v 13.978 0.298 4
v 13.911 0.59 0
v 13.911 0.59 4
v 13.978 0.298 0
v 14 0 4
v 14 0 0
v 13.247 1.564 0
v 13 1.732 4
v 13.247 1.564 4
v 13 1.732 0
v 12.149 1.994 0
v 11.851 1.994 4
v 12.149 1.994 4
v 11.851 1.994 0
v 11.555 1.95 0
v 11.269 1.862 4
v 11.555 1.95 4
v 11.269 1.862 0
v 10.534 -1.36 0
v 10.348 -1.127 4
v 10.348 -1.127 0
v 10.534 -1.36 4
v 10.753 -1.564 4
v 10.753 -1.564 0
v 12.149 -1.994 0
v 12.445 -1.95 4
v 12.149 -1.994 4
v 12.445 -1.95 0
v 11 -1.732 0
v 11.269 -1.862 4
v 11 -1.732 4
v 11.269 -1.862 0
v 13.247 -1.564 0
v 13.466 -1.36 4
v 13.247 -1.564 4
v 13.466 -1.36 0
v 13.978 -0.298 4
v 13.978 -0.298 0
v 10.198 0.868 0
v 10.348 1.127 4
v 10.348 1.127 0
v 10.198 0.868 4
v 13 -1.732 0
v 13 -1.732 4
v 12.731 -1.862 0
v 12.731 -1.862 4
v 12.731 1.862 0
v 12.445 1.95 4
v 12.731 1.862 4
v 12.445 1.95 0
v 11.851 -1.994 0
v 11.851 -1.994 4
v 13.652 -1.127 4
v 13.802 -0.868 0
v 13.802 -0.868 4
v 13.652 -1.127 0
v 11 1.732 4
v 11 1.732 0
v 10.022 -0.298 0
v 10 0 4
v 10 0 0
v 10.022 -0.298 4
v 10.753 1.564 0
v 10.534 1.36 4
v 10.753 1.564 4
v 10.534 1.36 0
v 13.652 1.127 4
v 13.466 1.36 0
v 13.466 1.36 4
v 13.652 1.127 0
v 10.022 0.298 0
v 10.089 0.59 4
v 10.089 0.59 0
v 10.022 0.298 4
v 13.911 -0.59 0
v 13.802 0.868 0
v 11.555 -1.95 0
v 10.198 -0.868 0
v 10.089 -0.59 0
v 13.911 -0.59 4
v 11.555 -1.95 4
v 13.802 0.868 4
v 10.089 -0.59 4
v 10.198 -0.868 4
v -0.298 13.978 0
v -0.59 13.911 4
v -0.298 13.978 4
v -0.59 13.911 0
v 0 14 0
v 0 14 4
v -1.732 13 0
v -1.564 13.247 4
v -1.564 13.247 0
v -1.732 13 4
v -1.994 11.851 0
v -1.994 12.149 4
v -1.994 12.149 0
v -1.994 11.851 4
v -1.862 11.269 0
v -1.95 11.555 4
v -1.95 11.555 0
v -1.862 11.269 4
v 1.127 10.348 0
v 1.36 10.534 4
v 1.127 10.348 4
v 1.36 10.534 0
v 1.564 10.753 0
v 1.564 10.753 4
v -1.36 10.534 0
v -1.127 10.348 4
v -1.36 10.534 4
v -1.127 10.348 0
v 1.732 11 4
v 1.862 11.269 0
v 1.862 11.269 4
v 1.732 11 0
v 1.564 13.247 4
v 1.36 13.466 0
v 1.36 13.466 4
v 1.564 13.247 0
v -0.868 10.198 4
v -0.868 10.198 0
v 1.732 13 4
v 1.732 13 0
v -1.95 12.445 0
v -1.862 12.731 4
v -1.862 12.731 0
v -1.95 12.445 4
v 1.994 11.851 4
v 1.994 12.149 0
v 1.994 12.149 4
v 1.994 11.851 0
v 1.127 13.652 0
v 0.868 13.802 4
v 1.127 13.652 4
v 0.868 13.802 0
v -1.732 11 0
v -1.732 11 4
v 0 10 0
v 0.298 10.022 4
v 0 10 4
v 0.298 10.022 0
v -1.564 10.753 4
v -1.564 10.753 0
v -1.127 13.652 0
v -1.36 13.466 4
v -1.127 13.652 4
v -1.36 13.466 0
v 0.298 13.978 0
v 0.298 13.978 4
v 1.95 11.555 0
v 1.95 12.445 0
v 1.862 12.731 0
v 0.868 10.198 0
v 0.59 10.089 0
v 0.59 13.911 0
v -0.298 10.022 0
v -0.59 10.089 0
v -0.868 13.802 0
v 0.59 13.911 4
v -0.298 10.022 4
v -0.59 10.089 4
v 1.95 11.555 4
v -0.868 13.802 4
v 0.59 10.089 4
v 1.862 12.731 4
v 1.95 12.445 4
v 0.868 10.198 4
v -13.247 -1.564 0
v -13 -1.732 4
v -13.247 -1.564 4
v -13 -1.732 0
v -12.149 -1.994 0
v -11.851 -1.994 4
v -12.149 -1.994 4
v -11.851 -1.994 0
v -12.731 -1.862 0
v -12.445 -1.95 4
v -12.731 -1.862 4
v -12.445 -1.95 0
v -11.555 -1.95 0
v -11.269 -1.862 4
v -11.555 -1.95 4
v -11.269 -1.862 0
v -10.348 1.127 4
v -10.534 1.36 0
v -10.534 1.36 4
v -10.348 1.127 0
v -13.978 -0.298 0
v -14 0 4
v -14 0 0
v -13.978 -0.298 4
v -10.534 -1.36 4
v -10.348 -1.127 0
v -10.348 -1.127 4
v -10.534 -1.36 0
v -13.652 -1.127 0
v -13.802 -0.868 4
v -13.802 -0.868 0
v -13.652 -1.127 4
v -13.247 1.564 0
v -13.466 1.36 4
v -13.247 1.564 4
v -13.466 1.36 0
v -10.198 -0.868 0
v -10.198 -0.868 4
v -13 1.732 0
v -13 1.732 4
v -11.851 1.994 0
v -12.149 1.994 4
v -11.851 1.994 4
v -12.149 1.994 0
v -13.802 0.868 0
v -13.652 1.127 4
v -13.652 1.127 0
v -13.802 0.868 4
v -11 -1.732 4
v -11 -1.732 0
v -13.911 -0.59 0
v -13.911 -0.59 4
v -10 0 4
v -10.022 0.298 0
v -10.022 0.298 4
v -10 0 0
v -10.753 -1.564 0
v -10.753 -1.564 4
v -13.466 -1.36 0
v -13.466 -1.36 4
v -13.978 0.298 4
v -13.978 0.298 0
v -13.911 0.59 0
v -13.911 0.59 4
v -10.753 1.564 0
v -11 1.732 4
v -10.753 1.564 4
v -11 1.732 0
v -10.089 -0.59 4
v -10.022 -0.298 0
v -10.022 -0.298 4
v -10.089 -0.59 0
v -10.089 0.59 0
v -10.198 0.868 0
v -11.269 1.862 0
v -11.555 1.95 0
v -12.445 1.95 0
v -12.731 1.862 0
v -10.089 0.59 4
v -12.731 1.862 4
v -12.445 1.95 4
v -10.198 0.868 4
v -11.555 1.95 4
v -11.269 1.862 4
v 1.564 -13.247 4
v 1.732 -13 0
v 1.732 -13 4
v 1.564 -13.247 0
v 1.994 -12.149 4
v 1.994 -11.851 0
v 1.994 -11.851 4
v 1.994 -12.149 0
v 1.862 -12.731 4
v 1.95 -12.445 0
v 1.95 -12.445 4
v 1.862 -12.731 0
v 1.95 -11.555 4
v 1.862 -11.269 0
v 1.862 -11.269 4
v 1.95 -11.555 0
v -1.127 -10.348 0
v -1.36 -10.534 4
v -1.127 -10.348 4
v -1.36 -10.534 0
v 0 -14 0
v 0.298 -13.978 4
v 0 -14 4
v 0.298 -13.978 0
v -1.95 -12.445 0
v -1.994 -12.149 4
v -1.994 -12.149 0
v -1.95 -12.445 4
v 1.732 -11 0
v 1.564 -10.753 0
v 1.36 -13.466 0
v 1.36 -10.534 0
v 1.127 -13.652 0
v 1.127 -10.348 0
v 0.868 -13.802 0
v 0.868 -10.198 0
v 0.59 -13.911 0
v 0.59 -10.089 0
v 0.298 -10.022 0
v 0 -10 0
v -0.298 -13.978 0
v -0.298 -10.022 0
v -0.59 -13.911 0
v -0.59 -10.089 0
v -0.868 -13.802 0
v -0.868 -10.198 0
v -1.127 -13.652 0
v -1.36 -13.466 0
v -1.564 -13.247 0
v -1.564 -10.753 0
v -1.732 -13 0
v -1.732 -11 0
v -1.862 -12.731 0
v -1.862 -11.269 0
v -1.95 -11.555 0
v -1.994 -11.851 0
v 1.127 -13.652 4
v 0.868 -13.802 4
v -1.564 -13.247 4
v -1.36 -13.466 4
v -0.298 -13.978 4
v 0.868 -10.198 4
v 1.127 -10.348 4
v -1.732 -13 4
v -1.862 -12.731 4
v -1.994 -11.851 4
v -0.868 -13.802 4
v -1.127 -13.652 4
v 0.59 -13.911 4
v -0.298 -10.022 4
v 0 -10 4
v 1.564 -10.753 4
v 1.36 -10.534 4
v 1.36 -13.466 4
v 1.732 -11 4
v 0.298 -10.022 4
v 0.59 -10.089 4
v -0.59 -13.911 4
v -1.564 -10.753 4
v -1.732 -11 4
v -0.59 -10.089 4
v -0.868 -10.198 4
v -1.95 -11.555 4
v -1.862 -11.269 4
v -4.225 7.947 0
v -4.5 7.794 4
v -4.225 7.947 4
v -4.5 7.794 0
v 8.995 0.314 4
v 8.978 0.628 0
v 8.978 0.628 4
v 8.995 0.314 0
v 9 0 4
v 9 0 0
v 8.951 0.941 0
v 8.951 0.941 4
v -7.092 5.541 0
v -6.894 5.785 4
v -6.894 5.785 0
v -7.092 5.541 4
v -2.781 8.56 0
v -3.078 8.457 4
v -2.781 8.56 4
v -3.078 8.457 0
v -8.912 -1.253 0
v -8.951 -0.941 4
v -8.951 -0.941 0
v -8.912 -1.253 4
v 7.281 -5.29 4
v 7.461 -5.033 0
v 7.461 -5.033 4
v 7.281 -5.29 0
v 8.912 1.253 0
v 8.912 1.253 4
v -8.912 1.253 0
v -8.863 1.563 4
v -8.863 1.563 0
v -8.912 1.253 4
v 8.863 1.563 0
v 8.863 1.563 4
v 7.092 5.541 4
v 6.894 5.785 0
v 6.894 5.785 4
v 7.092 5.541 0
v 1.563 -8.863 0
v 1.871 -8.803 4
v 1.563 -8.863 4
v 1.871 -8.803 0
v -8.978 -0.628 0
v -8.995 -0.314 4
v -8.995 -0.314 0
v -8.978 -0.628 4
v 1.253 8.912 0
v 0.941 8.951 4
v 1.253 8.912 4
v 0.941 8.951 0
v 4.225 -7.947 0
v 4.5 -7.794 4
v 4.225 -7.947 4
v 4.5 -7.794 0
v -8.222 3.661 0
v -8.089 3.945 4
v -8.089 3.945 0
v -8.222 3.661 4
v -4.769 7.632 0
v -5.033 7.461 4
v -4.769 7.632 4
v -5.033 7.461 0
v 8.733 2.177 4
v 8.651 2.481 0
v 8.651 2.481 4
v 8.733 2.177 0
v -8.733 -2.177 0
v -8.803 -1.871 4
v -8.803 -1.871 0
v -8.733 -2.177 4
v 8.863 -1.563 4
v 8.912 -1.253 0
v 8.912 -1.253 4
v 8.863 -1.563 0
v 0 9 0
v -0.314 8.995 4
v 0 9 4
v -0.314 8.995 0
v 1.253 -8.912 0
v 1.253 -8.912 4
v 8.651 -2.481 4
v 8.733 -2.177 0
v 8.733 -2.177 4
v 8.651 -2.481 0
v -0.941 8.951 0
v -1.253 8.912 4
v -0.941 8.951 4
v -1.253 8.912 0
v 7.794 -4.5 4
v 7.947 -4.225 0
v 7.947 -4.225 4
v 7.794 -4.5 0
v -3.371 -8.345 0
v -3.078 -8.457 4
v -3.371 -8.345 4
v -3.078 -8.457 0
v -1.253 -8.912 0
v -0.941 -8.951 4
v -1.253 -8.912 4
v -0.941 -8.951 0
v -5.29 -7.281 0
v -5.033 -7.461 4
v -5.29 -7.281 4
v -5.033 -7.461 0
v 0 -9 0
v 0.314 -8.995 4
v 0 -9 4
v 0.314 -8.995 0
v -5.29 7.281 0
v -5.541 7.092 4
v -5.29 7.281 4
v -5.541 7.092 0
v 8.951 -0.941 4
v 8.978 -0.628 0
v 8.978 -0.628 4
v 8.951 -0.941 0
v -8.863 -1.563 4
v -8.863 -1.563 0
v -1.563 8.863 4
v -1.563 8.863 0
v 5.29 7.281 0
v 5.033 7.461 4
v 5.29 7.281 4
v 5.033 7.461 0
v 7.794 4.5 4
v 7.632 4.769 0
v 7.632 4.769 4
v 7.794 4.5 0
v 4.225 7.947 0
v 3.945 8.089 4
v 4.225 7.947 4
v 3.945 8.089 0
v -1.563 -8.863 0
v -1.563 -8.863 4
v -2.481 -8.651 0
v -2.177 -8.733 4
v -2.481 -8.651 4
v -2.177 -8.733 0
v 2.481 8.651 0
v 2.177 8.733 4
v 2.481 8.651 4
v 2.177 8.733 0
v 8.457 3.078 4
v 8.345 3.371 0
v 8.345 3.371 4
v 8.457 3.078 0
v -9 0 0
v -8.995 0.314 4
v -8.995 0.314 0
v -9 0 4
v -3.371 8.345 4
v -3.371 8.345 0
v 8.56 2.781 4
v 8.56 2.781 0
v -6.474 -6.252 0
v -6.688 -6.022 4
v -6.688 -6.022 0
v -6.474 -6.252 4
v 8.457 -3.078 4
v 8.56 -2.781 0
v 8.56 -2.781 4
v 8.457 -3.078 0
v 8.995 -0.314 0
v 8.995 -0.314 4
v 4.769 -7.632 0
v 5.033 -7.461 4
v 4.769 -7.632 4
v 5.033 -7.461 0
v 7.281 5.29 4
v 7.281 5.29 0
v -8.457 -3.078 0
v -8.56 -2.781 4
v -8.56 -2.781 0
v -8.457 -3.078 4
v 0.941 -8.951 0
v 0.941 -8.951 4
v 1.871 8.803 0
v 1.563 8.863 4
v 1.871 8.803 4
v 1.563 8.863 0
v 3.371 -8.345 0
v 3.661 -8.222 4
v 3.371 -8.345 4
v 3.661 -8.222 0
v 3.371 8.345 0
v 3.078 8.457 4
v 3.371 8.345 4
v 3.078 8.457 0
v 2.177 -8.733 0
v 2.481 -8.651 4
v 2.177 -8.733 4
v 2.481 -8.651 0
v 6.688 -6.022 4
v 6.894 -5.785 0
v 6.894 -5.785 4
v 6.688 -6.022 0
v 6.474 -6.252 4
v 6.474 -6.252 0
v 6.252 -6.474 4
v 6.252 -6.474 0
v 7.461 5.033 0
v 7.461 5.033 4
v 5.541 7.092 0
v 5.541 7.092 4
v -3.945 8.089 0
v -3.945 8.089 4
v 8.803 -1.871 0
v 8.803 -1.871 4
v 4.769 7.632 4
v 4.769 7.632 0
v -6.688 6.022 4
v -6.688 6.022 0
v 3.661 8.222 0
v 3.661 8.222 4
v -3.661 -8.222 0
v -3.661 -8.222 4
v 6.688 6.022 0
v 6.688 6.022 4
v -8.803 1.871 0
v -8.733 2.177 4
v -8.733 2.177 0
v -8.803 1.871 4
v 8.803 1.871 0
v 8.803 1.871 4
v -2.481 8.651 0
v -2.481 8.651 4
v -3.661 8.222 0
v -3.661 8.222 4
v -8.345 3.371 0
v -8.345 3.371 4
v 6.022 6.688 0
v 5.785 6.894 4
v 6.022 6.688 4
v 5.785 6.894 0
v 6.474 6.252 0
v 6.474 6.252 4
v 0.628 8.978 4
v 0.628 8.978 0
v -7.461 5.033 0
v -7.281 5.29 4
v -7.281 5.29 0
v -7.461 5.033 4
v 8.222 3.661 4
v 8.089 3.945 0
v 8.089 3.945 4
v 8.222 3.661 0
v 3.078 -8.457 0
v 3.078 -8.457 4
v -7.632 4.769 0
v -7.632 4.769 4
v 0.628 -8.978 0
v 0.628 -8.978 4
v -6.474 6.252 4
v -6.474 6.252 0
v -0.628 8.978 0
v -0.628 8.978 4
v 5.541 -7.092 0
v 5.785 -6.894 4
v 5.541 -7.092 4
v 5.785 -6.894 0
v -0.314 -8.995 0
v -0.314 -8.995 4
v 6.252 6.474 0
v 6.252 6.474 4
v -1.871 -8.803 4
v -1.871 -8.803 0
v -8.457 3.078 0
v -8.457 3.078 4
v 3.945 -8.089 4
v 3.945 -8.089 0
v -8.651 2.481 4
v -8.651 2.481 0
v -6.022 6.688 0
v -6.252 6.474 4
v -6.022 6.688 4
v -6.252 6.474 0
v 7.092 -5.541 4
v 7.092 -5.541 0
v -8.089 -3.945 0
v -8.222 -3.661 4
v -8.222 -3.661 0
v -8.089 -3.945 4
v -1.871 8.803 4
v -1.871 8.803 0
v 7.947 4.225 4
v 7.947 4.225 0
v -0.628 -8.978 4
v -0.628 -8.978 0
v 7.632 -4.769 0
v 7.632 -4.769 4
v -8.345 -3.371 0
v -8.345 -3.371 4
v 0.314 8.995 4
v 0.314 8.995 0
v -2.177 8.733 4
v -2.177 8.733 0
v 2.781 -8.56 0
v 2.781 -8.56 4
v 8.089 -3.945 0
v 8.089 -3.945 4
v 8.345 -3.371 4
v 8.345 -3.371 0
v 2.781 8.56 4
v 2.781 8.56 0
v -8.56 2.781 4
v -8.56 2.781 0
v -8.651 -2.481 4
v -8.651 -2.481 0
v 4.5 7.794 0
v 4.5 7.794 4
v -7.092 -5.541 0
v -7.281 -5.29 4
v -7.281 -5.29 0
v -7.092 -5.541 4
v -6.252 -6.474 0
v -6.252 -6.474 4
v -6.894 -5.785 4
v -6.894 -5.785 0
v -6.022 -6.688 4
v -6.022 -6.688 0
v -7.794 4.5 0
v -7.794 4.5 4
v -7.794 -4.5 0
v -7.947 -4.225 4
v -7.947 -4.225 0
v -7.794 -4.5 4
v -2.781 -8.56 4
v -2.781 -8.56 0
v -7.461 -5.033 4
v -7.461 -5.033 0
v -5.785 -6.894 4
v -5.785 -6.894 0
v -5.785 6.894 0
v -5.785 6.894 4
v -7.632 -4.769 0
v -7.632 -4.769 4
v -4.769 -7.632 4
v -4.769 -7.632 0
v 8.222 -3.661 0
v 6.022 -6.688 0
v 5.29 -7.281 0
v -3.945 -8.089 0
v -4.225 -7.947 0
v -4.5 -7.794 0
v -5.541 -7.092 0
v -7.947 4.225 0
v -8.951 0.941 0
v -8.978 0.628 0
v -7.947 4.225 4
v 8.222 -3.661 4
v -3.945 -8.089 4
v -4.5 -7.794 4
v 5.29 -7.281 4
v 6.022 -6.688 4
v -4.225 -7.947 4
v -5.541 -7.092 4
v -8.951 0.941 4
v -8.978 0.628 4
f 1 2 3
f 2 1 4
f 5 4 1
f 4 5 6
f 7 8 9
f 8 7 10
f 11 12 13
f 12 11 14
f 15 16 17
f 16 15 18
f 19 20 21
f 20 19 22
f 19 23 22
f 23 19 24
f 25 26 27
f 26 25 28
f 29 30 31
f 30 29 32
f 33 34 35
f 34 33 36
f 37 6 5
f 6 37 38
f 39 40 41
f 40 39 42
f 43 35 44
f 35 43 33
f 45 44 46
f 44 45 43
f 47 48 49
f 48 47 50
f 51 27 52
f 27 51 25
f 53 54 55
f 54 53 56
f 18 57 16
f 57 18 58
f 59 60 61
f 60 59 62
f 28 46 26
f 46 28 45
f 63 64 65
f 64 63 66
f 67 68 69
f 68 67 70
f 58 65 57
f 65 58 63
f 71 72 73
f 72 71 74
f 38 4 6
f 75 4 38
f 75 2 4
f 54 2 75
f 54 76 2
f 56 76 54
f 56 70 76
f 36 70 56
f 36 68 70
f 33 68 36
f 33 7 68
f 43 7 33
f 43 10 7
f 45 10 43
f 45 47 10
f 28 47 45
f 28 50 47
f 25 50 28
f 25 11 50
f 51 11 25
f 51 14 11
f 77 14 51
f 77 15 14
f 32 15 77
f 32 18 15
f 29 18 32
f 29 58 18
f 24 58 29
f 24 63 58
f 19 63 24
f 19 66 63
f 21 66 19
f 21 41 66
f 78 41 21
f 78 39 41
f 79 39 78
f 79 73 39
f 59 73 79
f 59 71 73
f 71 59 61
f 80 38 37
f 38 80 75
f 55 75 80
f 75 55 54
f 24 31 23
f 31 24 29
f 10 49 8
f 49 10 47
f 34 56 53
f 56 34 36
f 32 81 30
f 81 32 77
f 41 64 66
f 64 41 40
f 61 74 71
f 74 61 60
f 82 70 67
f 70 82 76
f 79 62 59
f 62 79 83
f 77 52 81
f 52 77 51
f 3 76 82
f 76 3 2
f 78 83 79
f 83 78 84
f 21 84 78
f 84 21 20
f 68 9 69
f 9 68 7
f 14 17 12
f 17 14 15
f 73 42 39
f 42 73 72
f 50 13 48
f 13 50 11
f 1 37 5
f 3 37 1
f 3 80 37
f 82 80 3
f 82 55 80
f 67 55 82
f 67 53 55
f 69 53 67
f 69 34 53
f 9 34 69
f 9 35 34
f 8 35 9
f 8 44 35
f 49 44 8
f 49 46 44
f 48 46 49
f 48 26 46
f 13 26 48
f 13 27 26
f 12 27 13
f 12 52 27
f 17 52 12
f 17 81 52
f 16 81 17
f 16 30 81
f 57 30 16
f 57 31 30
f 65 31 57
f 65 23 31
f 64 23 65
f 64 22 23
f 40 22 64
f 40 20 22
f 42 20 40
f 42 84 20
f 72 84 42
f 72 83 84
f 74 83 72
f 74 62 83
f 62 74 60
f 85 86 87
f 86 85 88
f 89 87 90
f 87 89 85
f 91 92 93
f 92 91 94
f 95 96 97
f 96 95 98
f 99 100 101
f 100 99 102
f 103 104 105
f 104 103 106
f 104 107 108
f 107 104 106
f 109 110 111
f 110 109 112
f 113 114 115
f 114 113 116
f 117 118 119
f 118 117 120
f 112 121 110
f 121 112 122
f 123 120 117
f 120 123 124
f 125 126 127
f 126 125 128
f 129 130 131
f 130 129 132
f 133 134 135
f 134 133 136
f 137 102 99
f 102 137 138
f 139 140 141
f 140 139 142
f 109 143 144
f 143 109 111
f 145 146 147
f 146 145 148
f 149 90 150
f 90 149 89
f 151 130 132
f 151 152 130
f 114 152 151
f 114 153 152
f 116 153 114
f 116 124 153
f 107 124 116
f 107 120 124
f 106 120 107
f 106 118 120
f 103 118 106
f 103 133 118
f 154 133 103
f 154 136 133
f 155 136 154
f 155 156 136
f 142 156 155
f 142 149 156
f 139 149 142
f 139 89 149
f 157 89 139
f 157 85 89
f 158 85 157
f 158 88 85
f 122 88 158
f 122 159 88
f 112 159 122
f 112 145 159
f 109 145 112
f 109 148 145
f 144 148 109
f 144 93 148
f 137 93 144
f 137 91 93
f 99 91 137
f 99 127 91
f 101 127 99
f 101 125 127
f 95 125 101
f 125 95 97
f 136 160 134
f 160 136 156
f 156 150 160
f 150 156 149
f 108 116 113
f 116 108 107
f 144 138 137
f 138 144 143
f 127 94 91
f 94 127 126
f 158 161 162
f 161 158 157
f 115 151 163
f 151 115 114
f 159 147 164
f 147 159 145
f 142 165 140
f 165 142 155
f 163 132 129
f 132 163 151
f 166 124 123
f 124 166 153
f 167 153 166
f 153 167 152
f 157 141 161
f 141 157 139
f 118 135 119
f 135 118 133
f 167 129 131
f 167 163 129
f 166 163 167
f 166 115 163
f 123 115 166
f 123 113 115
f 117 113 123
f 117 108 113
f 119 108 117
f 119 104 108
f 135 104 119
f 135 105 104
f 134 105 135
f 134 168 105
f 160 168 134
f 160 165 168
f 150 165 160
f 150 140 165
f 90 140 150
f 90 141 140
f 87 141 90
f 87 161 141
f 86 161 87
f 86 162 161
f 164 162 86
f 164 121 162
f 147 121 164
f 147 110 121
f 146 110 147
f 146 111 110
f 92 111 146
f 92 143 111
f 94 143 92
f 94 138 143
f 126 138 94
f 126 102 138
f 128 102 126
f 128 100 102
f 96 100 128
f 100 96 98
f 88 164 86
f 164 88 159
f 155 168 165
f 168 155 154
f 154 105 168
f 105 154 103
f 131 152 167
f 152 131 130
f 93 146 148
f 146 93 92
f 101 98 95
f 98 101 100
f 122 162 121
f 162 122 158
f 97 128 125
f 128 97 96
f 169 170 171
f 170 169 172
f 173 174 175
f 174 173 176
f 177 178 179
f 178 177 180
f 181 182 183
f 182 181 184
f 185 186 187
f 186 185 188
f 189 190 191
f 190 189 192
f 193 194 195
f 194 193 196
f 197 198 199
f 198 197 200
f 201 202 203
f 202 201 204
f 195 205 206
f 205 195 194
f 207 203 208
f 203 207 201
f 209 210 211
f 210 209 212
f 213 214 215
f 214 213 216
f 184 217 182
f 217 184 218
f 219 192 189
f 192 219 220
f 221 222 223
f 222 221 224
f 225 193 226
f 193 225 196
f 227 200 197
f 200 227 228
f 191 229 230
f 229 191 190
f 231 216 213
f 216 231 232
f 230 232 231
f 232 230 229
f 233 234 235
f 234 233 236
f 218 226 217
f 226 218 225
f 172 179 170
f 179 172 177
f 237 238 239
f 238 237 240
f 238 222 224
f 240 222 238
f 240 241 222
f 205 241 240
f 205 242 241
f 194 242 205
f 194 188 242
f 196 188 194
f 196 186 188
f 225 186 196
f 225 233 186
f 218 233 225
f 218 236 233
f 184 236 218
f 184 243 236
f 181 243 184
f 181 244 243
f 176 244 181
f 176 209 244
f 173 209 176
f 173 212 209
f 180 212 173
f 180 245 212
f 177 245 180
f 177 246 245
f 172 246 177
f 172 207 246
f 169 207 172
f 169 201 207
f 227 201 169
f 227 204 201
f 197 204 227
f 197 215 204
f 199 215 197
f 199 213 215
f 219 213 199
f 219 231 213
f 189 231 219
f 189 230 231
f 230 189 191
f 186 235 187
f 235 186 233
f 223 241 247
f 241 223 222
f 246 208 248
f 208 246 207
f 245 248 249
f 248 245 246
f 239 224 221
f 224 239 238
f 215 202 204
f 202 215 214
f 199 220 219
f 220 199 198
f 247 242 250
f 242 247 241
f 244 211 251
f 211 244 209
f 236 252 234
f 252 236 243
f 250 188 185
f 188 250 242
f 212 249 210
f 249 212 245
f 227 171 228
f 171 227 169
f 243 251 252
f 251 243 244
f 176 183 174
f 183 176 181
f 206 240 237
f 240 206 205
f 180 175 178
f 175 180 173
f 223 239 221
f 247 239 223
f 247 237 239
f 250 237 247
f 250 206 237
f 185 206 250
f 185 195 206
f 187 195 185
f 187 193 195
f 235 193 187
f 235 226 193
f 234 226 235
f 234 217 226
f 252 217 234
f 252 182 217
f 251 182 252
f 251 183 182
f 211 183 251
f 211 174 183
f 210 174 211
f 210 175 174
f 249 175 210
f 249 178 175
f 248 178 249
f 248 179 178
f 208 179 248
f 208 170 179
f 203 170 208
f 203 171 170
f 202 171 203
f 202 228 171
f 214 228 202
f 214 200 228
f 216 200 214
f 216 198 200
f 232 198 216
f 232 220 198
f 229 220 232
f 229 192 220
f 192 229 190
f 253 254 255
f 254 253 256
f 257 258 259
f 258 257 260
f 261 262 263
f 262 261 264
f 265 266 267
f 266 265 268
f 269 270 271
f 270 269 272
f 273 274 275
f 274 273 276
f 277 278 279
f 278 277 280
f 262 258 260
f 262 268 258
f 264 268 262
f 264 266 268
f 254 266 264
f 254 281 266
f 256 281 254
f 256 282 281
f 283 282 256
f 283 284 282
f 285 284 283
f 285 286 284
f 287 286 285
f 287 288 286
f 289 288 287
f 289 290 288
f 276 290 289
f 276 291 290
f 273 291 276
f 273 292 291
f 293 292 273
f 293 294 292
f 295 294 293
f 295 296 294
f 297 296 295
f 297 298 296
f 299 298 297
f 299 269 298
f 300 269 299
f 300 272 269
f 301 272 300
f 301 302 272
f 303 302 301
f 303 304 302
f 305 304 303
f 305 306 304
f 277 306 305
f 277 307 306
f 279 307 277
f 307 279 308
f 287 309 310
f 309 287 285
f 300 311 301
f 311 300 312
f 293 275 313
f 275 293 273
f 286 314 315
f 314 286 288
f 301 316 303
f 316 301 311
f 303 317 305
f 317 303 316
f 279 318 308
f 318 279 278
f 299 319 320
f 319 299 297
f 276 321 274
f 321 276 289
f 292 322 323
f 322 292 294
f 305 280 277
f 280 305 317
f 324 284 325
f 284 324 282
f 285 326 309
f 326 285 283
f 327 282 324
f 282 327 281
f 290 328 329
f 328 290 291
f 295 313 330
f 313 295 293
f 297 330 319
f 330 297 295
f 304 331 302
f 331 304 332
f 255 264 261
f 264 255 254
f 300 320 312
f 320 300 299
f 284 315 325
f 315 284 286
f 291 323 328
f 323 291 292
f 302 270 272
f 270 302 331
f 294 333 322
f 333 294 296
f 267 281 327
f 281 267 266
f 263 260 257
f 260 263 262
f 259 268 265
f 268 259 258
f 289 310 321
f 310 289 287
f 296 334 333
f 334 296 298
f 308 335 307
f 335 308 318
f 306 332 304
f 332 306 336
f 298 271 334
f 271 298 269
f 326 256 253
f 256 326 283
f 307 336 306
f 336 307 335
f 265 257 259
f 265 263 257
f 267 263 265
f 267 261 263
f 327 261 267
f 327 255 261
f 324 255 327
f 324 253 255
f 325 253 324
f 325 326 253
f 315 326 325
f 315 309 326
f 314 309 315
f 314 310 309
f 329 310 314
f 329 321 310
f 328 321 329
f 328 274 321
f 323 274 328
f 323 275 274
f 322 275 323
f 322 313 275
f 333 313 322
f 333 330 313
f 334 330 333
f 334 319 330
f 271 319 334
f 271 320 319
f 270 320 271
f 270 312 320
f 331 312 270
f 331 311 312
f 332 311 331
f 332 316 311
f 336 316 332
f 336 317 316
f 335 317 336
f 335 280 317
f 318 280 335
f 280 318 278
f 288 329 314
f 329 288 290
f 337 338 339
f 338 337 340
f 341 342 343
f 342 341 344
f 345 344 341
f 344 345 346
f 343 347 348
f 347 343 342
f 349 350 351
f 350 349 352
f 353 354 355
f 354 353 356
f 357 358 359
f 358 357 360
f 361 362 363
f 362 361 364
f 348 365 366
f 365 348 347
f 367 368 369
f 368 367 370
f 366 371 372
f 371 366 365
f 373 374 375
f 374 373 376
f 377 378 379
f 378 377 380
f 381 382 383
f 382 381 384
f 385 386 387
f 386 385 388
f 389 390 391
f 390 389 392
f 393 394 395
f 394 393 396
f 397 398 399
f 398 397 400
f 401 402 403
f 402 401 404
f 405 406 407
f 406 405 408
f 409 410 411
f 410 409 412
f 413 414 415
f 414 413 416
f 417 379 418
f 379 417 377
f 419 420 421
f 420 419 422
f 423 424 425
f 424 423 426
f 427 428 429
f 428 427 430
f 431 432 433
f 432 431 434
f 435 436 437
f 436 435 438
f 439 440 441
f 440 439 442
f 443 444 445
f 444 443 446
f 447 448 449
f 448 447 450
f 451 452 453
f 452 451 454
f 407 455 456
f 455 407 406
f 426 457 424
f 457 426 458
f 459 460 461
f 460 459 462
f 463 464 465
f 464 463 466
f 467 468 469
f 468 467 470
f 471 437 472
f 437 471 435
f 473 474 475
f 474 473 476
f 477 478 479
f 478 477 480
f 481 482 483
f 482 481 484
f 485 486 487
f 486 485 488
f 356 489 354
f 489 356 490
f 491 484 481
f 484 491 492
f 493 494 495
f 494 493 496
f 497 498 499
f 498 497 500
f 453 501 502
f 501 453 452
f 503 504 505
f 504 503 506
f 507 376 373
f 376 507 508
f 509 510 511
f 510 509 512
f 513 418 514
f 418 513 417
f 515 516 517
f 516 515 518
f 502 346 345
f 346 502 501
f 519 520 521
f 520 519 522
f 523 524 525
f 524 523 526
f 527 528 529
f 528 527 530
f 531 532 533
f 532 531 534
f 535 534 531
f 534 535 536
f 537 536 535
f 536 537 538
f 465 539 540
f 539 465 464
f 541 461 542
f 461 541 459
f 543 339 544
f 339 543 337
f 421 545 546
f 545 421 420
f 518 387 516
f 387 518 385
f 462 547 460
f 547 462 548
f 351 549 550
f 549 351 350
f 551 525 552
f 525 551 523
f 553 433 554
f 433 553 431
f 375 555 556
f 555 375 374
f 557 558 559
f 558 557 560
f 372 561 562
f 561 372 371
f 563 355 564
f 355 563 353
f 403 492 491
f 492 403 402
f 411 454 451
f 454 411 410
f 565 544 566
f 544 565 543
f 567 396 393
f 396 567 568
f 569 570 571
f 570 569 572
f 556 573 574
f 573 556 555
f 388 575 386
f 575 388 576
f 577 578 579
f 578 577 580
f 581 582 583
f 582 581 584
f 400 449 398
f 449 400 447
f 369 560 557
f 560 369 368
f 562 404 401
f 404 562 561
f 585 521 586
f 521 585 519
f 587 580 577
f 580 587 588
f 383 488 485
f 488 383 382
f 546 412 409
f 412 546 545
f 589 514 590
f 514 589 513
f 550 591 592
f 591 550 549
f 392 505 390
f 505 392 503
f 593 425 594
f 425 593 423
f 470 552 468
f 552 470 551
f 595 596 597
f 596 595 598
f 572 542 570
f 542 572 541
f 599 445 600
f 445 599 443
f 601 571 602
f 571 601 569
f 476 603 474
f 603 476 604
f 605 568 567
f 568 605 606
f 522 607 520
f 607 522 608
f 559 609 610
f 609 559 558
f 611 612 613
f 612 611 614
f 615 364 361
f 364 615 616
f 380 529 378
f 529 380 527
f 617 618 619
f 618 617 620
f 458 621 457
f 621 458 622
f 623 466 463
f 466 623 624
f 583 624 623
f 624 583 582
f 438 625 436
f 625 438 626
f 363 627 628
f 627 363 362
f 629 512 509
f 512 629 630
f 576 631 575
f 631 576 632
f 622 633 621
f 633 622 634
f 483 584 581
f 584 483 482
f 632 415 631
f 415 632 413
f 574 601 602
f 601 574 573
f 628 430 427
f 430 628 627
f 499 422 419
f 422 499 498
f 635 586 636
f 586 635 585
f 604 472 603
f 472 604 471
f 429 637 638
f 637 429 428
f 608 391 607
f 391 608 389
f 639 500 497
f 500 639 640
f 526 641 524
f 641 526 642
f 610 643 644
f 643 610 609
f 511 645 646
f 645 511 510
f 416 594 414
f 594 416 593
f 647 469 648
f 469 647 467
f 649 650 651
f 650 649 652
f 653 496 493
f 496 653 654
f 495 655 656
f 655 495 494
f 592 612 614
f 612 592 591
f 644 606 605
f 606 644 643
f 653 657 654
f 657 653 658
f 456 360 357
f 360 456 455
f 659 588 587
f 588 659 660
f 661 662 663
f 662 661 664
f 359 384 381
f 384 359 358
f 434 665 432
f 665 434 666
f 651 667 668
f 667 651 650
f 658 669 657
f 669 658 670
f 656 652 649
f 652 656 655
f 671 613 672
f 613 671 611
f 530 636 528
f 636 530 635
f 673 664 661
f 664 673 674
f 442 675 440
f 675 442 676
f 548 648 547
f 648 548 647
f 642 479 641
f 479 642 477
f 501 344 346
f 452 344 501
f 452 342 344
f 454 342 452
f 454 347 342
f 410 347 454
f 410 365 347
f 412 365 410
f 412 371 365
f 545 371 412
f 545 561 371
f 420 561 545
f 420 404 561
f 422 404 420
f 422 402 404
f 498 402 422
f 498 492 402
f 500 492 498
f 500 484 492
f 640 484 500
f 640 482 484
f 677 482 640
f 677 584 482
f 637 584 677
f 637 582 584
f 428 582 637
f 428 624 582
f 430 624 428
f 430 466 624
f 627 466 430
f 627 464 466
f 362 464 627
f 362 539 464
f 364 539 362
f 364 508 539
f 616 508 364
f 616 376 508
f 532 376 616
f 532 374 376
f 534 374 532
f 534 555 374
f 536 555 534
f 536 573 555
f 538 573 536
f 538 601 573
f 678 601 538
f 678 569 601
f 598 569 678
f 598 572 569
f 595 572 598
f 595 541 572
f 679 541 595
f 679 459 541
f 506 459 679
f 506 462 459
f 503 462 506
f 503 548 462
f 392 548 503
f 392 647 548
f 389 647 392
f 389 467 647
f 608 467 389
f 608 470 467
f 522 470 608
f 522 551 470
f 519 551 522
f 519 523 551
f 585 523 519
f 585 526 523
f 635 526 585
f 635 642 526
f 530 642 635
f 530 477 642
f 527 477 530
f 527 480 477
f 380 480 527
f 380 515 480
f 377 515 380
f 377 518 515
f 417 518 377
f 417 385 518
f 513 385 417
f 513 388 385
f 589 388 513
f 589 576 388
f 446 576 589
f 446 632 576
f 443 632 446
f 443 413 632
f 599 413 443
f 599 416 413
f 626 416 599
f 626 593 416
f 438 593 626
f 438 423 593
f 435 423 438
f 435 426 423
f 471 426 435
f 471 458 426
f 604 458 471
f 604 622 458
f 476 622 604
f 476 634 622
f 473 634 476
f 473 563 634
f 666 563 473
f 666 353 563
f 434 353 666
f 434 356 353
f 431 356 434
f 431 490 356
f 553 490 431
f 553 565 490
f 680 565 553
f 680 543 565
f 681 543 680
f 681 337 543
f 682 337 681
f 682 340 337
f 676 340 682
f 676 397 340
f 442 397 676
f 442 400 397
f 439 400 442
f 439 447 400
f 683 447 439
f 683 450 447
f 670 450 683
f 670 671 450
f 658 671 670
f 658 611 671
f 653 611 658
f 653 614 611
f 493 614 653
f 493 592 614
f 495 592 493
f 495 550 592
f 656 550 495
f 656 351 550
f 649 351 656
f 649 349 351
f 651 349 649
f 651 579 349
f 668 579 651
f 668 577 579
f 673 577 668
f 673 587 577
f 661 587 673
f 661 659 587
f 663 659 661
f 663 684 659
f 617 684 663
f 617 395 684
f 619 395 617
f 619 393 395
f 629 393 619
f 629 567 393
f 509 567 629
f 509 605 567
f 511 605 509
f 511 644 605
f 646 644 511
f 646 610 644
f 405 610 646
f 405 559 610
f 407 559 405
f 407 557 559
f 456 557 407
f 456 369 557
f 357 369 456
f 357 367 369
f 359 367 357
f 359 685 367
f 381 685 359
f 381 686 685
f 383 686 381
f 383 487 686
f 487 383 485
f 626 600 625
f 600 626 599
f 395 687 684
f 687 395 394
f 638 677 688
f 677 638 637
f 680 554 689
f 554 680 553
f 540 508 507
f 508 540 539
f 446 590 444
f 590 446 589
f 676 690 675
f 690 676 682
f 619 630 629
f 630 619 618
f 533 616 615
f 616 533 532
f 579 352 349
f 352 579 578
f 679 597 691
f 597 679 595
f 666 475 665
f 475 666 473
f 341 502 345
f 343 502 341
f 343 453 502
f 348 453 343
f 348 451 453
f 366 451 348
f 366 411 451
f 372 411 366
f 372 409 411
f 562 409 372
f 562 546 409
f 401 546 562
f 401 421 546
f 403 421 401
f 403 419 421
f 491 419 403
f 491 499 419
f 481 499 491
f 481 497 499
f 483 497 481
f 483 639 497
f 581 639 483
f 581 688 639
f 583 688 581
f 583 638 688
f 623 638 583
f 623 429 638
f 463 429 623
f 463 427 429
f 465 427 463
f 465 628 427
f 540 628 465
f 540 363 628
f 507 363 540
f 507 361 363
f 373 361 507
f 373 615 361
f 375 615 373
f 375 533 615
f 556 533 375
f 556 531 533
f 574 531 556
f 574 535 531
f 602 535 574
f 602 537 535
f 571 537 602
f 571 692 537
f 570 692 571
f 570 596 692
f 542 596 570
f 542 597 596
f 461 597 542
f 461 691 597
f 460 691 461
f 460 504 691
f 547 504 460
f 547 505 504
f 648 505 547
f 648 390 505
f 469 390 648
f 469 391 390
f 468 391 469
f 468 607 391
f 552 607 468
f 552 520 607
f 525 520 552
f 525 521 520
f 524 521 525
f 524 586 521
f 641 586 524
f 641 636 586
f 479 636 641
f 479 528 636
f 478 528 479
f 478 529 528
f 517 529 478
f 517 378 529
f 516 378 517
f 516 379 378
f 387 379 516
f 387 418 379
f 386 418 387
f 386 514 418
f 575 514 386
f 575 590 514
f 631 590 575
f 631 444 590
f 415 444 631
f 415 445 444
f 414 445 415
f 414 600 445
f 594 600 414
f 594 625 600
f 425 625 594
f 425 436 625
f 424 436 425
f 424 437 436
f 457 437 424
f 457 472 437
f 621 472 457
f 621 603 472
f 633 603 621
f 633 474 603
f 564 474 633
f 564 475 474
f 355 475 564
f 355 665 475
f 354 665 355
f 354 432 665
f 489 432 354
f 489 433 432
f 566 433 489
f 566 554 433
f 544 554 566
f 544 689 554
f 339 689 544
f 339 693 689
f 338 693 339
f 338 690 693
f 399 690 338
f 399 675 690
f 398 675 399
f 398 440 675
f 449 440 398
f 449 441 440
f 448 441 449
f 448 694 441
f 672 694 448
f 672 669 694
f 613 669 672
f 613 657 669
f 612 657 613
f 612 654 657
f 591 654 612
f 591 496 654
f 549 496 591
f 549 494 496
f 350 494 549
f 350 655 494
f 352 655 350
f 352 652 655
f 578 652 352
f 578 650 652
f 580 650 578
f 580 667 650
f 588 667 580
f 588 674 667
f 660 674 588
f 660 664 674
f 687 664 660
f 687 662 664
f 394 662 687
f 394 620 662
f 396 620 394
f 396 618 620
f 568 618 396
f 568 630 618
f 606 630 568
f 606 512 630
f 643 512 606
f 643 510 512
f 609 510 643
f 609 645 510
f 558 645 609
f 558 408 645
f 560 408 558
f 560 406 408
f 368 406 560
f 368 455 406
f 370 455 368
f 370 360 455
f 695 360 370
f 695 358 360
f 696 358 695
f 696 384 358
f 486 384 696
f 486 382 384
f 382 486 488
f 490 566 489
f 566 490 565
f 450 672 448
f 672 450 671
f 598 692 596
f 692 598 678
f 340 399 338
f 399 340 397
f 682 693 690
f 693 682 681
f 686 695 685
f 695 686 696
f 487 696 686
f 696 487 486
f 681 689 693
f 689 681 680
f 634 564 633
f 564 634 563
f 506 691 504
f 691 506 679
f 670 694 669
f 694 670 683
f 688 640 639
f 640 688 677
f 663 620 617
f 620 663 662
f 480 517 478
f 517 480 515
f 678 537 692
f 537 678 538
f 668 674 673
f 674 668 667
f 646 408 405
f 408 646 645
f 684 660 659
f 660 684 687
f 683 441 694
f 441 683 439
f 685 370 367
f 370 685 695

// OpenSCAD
// Reproduction of INCIDENTS.md 2026-08-19 (gearbox_frame): a fix for one
// collision widened the bearing tower's support legs from 7mm to 15mm radius.
// That solved the collision, but the legs at their NEW radius no longer
// touched the bearing disc (9mm radius) they were supposed to hold up --
// a permanent 3mm gap, two disconnected solids in one STL that still had a
// correct overall bounding box.
//
// Deliberately NO "// EXPECTED_BODIES:" declaration: the point of this
// fixture is that a single printed part silently splitting in two is an
// error by DEFAULT, with no declaration needed.

$fa = 2; $fs = 0.3;

// the bearing disc
translate([0, 0, 0]) cylinder(r = 9, h = 4);

// the support legs, at a radius that no longer reaches the disc
for (a = [0 : 90 : 270])
    rotate([0, 0, a]) translate([12, 0, 0]) cylinder(r = 2, h = 4);
// gap between disc edge (r=9) and legs' inner edge (r=10) -> disconnected
